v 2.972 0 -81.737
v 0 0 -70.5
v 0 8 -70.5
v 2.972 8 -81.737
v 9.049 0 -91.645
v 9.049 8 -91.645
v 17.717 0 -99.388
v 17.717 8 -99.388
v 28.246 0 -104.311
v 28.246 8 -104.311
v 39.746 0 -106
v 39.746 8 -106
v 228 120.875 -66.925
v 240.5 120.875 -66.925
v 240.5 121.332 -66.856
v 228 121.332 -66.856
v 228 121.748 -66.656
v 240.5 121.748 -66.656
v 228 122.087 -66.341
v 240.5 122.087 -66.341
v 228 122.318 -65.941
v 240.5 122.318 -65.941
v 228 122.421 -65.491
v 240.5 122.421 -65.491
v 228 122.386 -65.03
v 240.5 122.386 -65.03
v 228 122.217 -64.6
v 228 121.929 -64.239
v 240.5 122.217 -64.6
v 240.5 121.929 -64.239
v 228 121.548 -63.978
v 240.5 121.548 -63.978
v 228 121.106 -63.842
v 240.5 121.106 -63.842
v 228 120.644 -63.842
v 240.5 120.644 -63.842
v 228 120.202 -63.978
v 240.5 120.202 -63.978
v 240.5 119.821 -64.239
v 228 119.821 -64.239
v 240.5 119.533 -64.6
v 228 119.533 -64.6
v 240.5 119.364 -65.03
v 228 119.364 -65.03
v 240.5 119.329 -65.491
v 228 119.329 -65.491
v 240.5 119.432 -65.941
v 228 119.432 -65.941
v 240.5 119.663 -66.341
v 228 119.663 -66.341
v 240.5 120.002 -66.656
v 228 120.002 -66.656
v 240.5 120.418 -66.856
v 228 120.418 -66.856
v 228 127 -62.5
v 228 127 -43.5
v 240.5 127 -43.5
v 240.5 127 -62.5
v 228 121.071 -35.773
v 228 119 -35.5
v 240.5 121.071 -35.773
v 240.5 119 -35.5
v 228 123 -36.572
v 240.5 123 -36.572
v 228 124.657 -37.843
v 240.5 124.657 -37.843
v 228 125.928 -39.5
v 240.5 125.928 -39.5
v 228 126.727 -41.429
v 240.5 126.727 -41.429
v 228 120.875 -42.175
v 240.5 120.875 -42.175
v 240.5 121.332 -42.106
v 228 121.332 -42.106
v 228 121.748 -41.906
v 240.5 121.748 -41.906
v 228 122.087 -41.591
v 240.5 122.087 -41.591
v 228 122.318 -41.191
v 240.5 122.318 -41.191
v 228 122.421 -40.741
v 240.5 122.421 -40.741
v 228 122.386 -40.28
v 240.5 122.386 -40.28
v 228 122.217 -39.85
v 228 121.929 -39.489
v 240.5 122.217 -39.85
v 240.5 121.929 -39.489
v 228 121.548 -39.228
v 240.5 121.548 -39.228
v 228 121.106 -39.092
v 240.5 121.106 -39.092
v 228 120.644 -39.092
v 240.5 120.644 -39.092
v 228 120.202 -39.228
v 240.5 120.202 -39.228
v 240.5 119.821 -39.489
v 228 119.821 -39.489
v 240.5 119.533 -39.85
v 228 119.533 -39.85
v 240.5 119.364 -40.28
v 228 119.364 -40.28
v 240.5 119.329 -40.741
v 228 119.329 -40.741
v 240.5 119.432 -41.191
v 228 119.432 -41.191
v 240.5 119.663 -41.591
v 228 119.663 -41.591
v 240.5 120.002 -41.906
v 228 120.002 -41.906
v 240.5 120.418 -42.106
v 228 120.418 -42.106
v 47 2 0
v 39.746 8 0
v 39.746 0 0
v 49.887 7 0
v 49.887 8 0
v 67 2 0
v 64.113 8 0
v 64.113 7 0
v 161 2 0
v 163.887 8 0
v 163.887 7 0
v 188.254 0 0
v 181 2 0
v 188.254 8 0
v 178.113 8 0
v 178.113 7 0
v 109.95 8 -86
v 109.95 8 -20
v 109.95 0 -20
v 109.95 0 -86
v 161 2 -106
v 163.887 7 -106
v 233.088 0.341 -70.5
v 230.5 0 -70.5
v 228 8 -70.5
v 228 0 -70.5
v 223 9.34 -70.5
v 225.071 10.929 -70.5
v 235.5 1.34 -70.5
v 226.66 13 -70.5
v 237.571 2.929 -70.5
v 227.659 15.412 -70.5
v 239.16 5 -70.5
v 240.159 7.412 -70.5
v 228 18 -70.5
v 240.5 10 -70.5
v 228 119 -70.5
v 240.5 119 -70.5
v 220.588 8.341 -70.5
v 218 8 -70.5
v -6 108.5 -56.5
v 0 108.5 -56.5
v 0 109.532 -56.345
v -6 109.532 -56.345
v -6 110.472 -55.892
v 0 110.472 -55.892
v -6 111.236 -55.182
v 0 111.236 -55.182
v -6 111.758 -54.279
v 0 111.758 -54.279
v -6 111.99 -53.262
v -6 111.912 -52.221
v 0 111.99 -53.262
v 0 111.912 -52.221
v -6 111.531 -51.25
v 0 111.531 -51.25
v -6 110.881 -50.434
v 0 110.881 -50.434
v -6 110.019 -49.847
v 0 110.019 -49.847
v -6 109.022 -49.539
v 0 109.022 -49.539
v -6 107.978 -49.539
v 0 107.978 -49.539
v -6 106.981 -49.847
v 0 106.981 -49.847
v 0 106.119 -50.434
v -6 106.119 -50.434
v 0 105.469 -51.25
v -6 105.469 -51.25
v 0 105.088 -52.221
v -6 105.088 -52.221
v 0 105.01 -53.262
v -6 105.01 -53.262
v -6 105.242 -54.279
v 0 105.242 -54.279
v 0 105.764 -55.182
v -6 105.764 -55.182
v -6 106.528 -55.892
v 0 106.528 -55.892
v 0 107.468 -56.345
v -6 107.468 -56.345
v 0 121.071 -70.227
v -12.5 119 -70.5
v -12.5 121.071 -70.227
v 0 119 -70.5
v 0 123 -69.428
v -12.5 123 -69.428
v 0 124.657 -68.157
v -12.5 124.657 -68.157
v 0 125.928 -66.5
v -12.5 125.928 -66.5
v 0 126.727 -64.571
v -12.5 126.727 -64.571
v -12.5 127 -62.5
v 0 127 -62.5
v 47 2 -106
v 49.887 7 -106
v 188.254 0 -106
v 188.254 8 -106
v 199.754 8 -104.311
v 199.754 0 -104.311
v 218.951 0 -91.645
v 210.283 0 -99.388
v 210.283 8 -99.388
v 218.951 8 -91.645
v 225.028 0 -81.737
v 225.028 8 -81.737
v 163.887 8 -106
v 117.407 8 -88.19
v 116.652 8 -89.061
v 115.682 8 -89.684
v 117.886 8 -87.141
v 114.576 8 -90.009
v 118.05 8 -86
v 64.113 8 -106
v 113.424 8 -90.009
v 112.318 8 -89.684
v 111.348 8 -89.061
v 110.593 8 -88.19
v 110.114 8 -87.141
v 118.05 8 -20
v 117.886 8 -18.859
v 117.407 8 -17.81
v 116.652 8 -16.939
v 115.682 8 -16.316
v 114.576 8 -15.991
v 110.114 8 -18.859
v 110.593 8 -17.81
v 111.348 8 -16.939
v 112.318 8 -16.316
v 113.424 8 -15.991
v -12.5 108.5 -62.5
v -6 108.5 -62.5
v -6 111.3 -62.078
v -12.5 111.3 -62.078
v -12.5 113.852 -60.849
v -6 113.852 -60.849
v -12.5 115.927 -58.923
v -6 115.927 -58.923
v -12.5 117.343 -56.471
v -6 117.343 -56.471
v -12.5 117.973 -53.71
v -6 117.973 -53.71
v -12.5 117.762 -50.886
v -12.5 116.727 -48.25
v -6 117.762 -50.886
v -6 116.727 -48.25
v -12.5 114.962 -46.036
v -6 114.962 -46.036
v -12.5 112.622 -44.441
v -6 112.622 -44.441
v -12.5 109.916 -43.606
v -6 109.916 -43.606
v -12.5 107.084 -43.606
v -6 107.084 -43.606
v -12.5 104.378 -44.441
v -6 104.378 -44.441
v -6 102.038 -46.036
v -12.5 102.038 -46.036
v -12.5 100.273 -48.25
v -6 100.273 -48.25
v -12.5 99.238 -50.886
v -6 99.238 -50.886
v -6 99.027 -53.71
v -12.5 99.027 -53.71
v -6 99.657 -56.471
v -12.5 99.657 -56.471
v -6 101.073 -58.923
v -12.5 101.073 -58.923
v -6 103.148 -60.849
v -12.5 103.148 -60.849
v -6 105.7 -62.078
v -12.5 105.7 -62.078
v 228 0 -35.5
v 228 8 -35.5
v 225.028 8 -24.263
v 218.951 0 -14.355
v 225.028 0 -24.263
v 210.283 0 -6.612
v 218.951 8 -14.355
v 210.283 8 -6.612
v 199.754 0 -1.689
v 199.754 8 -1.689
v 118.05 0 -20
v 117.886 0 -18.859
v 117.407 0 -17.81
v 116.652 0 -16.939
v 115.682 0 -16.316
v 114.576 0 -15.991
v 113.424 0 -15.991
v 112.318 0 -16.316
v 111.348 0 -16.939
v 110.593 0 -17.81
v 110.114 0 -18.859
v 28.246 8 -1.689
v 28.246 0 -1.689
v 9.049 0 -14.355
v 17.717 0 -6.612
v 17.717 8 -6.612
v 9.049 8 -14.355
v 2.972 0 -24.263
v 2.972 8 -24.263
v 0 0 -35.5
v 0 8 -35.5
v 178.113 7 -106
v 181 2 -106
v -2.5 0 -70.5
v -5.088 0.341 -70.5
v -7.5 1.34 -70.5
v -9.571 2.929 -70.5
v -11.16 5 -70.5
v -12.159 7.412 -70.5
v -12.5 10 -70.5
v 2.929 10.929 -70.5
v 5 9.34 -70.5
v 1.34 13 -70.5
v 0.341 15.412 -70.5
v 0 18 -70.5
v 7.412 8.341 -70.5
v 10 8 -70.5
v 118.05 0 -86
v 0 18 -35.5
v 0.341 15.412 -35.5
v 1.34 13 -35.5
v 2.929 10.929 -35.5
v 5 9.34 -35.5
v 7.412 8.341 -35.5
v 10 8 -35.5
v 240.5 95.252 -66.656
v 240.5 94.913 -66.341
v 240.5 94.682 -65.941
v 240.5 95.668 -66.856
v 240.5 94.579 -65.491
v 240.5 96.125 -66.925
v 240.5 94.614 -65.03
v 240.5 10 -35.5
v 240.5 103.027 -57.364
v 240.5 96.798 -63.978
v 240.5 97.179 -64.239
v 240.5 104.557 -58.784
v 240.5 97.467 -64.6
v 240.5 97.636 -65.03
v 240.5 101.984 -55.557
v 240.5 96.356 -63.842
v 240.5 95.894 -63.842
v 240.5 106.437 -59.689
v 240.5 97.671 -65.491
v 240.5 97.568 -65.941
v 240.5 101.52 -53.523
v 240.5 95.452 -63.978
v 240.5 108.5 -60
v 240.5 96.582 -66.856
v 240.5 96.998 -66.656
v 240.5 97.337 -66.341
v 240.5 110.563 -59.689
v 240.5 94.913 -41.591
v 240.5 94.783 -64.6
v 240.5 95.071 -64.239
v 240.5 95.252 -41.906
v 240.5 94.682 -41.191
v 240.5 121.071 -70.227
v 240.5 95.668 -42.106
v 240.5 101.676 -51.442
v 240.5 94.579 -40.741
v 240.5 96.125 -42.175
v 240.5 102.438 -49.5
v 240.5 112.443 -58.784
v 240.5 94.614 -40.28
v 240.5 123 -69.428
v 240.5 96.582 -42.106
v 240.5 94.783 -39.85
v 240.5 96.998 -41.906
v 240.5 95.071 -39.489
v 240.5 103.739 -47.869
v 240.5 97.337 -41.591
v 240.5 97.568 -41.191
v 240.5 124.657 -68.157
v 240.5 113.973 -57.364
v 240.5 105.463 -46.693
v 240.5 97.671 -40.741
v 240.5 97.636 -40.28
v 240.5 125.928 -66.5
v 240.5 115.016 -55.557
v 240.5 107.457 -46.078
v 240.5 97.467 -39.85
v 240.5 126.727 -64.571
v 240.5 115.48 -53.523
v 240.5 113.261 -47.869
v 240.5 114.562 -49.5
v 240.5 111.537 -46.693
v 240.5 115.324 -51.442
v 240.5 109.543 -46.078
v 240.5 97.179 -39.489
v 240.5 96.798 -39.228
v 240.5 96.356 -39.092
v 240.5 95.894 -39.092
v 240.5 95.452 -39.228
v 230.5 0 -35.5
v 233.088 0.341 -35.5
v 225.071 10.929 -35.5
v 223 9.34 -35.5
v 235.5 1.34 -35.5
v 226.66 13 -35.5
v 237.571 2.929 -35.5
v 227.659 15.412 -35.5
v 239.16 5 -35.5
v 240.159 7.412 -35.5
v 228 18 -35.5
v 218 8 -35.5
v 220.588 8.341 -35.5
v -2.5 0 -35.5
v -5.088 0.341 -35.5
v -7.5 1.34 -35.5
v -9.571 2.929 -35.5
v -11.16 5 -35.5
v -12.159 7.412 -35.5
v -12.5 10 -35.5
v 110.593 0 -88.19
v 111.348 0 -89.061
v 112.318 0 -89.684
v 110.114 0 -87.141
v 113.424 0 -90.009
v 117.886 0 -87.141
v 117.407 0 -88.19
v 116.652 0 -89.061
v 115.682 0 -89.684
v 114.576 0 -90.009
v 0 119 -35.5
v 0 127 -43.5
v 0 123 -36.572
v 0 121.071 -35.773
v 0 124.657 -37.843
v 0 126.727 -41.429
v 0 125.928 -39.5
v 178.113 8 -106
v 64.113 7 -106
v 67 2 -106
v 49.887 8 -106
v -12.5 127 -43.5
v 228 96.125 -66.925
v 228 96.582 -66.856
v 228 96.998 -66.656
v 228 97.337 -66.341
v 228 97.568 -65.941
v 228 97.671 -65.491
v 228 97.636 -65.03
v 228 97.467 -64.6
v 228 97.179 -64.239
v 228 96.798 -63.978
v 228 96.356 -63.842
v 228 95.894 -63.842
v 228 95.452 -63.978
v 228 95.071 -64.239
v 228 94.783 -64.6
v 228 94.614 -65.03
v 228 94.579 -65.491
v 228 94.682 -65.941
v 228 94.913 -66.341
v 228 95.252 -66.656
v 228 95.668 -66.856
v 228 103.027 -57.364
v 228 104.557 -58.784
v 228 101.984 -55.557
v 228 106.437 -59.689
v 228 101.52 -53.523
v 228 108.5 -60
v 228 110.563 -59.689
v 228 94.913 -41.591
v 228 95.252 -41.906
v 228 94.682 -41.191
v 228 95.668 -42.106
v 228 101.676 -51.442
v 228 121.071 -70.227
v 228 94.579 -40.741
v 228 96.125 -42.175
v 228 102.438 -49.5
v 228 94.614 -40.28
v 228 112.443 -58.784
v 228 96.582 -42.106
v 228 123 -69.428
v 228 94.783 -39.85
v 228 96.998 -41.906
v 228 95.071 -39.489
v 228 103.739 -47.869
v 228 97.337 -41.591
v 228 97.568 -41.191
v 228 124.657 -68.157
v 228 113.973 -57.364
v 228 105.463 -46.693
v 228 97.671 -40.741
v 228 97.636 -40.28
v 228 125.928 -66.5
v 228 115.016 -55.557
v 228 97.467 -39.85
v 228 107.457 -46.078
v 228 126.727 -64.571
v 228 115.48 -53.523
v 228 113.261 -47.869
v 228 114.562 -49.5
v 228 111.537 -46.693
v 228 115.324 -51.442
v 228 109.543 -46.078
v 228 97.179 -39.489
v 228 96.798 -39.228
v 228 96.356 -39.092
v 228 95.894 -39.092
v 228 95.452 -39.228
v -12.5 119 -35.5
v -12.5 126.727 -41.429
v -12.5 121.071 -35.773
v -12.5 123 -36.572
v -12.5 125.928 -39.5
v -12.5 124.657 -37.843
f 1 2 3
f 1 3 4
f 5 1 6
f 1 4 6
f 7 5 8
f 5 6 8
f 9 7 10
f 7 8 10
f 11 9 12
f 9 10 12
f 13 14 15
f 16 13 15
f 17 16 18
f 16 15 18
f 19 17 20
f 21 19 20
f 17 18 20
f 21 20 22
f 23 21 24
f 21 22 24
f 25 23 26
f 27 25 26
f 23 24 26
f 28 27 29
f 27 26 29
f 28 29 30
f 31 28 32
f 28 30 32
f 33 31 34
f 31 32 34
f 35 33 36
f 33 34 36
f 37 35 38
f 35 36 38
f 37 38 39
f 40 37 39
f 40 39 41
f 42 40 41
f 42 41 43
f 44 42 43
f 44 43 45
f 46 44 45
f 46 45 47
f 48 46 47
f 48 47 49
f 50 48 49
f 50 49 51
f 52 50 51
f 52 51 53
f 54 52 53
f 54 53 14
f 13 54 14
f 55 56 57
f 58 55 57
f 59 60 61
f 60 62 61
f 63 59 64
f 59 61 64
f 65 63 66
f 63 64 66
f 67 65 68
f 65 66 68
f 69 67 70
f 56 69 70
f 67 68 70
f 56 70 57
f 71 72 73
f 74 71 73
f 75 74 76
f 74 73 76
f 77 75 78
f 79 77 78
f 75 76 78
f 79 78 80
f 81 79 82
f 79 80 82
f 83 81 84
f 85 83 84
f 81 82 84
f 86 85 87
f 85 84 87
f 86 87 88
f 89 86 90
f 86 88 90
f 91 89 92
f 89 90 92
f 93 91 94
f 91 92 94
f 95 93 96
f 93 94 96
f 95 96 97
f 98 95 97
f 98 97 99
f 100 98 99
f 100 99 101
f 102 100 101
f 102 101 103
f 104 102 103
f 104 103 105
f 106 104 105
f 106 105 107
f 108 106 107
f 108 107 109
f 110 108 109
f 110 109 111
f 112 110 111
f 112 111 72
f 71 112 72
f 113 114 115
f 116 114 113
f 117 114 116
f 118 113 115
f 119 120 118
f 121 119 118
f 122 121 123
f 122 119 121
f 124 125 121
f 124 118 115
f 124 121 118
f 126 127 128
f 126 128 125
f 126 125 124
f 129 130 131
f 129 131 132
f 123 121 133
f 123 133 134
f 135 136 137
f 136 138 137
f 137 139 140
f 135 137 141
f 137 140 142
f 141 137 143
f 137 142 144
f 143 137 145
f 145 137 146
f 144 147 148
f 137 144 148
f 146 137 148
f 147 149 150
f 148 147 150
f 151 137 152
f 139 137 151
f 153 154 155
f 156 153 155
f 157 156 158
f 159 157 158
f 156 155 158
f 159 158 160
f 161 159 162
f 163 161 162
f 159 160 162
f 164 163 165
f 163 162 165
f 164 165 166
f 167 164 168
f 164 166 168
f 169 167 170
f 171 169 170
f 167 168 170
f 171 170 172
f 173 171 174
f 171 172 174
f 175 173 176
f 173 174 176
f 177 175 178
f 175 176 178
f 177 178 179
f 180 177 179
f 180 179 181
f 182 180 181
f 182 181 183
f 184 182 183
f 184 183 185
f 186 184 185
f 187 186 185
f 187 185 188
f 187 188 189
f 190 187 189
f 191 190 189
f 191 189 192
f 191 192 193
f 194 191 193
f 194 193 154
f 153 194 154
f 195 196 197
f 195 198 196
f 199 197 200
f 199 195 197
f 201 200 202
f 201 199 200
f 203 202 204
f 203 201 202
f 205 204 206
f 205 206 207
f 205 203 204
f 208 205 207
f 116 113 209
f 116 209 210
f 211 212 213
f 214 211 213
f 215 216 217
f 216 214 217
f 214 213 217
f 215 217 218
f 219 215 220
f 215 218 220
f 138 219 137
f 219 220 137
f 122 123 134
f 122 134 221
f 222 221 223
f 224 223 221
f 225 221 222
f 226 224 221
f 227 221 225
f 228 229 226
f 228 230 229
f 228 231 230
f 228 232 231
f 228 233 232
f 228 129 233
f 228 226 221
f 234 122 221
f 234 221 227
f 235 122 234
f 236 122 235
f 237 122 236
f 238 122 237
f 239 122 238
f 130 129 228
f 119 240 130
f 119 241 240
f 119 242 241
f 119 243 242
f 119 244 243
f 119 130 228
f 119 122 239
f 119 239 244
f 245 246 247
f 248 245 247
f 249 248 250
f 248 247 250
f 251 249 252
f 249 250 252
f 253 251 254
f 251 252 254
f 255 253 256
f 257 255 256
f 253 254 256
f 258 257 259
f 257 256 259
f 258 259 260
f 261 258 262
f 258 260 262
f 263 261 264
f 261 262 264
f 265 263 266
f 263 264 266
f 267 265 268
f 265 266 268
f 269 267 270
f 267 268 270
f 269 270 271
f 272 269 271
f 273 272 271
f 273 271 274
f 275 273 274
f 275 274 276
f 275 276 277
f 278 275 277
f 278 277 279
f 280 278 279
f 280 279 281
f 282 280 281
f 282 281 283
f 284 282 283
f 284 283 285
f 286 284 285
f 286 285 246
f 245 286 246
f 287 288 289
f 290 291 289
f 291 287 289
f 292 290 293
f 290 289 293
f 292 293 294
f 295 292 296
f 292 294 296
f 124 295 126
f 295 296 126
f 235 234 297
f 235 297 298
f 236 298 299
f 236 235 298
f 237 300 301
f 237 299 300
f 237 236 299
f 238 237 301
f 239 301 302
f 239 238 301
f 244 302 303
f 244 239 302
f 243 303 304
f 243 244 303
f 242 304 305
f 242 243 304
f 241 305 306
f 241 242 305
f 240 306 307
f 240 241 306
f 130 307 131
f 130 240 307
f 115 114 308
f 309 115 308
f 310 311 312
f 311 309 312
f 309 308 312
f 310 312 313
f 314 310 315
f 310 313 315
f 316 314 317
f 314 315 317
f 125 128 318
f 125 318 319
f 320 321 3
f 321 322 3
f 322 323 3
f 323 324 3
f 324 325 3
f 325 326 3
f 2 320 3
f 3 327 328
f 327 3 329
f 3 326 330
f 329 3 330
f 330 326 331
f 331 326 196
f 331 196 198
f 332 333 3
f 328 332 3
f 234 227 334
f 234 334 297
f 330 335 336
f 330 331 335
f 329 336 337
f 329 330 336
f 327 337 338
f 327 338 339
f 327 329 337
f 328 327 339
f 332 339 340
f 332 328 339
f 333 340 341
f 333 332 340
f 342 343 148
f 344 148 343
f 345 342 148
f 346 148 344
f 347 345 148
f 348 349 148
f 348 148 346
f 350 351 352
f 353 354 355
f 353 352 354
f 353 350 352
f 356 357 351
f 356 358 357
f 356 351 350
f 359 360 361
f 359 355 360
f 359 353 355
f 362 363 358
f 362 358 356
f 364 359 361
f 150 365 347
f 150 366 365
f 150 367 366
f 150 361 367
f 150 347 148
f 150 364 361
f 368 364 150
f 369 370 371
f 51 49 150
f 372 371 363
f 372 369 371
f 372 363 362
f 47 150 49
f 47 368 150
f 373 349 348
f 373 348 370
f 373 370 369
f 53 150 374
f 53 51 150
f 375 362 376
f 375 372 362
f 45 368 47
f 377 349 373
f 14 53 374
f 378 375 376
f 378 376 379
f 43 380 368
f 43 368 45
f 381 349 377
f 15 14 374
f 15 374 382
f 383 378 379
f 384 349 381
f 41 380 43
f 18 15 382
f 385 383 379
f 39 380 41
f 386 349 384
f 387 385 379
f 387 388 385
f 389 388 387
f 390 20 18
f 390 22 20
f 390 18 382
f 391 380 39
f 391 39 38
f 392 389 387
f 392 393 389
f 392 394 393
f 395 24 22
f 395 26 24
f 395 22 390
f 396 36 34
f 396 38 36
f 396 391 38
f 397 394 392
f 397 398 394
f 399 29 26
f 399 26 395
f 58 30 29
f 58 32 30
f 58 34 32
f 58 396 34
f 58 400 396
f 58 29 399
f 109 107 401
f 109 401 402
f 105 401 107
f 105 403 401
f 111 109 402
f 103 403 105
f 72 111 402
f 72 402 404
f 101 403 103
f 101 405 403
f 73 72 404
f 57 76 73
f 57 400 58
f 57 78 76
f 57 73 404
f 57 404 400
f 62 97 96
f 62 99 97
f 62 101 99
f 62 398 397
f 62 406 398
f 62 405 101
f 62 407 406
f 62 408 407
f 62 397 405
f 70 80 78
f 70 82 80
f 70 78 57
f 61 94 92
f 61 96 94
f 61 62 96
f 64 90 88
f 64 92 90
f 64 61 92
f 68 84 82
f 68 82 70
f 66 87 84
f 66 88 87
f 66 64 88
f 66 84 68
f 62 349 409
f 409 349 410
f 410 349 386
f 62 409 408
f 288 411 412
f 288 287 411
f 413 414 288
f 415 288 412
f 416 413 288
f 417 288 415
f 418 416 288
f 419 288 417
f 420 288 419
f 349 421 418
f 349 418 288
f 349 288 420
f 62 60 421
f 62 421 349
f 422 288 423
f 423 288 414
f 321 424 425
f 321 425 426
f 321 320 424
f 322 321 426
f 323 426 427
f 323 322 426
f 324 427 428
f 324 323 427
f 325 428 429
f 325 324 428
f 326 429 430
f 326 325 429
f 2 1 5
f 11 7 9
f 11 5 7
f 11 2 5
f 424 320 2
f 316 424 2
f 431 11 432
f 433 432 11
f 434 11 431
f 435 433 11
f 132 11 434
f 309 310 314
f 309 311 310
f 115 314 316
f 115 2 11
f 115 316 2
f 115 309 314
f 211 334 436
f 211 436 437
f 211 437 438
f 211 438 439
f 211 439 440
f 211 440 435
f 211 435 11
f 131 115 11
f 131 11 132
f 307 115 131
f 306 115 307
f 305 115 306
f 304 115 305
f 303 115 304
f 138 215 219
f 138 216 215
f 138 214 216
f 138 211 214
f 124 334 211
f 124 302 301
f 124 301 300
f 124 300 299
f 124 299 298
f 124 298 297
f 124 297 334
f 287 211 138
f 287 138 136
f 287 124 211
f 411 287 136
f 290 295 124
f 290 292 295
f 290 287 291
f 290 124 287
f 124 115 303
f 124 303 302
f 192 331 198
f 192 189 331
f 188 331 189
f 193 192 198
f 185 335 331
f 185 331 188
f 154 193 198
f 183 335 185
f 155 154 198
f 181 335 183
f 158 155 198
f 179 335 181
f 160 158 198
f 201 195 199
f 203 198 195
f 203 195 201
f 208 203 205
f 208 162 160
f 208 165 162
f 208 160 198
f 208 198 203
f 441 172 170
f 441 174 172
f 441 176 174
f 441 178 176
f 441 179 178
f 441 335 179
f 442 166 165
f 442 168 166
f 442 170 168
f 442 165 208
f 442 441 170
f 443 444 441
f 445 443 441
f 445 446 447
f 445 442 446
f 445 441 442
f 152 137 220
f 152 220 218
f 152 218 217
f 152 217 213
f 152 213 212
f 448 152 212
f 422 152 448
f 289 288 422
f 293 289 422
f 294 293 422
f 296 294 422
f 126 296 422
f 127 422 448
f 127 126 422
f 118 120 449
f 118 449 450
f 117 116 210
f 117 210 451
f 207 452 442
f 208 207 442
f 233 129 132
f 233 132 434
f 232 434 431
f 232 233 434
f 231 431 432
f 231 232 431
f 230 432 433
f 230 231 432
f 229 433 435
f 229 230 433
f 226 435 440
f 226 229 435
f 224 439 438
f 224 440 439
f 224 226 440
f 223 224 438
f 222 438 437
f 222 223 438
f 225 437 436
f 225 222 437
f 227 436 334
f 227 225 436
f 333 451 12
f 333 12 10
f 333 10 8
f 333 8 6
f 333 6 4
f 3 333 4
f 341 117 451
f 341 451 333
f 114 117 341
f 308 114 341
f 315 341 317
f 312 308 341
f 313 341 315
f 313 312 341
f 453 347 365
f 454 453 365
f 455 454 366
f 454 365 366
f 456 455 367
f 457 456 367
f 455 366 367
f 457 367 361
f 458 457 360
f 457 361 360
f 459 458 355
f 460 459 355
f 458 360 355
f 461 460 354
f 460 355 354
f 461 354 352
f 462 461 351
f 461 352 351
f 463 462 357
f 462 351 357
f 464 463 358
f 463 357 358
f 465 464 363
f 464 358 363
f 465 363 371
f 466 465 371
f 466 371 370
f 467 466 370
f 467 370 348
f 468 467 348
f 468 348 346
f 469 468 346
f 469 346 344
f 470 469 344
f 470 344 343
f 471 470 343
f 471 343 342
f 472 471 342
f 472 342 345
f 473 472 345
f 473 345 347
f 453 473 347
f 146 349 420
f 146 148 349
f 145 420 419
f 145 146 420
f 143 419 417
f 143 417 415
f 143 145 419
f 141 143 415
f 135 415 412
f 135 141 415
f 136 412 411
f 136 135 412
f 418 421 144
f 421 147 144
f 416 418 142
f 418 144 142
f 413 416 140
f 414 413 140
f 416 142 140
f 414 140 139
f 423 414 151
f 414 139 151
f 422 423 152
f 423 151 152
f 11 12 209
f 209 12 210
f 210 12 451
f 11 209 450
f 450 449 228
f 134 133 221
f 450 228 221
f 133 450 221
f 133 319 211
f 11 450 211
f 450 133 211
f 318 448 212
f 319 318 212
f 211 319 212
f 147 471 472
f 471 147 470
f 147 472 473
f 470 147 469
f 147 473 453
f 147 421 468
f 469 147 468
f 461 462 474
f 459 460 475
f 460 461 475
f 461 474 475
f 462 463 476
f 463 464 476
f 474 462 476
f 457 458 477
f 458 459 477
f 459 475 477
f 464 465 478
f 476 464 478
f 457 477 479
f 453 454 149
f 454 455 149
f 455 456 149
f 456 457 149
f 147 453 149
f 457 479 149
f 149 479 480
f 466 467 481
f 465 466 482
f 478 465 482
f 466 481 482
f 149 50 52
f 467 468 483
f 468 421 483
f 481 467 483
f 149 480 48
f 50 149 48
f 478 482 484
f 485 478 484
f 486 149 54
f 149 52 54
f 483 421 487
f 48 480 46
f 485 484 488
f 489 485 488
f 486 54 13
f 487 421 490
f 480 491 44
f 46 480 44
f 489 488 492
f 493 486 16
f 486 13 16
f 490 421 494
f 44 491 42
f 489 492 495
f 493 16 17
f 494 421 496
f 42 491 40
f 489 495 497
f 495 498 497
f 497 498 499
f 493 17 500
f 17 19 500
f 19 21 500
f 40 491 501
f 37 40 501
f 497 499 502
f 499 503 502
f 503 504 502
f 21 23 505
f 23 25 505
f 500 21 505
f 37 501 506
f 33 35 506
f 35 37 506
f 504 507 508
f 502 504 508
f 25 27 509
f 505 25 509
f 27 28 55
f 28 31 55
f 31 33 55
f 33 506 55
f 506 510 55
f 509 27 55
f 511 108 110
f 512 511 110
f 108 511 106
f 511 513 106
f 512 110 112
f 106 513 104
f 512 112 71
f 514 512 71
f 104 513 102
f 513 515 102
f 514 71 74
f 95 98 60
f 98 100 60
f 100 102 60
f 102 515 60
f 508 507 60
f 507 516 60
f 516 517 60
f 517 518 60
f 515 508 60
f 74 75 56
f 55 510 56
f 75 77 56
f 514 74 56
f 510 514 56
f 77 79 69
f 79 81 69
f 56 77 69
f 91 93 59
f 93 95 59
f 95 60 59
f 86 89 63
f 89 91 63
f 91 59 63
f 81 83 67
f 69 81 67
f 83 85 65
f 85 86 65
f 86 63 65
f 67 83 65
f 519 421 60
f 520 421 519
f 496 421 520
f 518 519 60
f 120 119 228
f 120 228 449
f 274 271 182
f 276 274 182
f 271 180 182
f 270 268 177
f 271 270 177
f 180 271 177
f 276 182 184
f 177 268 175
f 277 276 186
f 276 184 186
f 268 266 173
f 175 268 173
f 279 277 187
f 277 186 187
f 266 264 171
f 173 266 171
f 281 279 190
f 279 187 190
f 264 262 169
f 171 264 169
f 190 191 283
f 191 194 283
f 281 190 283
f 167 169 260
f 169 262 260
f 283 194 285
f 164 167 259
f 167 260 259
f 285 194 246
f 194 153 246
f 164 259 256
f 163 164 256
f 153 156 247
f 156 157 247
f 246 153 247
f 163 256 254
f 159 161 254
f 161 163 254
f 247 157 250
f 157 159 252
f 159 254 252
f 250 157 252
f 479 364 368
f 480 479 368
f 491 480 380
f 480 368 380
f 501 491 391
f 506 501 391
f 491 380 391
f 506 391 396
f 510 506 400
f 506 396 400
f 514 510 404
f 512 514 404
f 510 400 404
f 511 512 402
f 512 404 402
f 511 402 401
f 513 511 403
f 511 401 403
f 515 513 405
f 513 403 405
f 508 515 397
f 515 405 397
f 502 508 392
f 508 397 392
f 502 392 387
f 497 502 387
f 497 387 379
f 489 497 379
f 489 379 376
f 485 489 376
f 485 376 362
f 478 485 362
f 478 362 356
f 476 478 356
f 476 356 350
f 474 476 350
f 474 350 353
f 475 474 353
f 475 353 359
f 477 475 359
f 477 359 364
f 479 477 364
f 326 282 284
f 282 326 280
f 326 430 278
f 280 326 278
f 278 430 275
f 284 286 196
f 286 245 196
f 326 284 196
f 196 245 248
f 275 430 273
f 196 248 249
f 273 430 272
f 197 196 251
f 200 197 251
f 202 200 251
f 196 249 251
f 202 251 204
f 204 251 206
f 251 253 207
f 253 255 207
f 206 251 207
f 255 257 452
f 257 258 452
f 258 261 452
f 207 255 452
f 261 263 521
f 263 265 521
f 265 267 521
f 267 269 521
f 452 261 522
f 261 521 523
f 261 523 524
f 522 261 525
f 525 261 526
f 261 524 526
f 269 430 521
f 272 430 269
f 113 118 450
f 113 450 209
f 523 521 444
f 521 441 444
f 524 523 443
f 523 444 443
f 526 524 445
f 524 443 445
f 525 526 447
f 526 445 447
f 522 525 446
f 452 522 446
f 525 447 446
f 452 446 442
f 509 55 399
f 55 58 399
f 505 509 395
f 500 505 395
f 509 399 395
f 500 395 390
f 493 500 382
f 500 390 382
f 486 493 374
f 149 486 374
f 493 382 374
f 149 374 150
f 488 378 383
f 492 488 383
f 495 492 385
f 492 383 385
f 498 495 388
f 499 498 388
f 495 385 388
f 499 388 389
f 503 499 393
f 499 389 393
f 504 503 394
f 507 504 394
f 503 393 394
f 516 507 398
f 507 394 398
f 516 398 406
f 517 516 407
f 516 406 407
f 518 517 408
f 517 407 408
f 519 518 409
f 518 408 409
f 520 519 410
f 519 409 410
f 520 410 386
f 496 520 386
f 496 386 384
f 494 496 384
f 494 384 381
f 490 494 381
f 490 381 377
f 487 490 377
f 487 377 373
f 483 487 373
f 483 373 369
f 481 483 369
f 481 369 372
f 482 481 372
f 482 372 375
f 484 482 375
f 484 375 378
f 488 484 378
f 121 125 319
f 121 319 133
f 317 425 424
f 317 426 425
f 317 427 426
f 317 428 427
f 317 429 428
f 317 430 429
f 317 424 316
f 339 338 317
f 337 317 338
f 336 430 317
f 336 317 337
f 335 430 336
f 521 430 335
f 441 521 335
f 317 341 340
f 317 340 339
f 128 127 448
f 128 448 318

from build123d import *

# Parameters (mm, degrees)
SKETCH1_W           = 12.5
SKETCH1_H           = 127
BOSS_EXTRUDE1_DEPTH = 106
SKETCH2_W           = 12.5
SKETCH2_H           = 35.5
CUT_EXTRUDE1_DEPTH  = 200
SKETCH4_4_R         = 6
CUT_EXTRUDE3_DEPTH  = 37
SKETCH4_R           = 7
SKETCH4_R_2         = 1.55
CUT_EXTRUDE4_DEPTH  = 18.375
FILLET3_R           = 8
FILLET4_R           = 10
FILLET5_R           = 40
SKETCH5_R           = 3.5
CUT_EXTRUDE5_DEPTH  = 25
CUT_EXTRUDE6_START  = -6
SKETCH5_3_R         = 9.5
SKETCH5_3_R_2       = 3.5
CUT_EXTRUDE6_DEPTH  = 7


with BuildPart() as part:
    # Sketch1 → Boss-Extrude1 (new body)
    with BuildSketch(Plane.XY):
        Polygon((0, 8), (0, 0), (228, 0), (228, 8), (178.113248654, 8), (178.113248654, 7), (181, 2), (161, 2), (163.886751346, 7), (163.886751346, 8), (64.113248654, 8), (64.113248654, 7), (67, 2), (47, 2), (49.886751346, 7), (49.886751346, 8), align=None)
        with Locations((234.25, 63.5)):
            Rectangle(SKETCH1_W, SKETCH1_H)
        with Locations((-6.25, 63.5)):
            Rectangle(SKETCH1_W, SKETCH1_H)
    extrude(amount=-BOSS_EXTRUDE1_DEPTH)

    # Sketch2 → Cut-Extrude1 (cut)
    with BuildSketch(Plane(origin=(0, 127, 0), x_dir=(1, 0, 0), z_dir=(0, 1, 0))):
        with Locations((-6.25, 88.25)):
            Rectangle(SKETCH2_W, SKETCH2_H)
        with Locations((-6.25, 17.75)):
            Rectangle(SKETCH2_W, SKETCH2_H)
        with Locations((234.25, 88.25)):
            Rectangle(SKETCH2_W, SKETCH2_H)
        with Locations((234.25, 17.75)):
            Rectangle(SKETCH2_W, SKETCH2_H)
        with BuildLine():
            Line((109.95, 20), (109.95, 86))
            ThreePointArc((109.95, 86), (114, 90.05), (118.05, 86))
            Line((118.05, 86), (118.05, 20))
            ThreePointArc((118.05, 20), (114, 15.95), (109.95, 20))
        make_face()
    extrude(amount=-CUT_EXTRUDE1_DEPTH, mode=Mode.SUBTRACT)

    # Sketch4<4> → Cut-Extrude3 (cut)
    with BuildSketch(Plane(origin=(240.5, 0, 0), x_dir=(0, 0, -1), z_dir=(1, 0, 0))):
        with Locations((53, 108.5)):
            Circle(SKETCH4_4_R)
    extrude(amount=-CUT_EXTRUDE3_DEPTH, mode=Mode.SUBTRACT)

    # Sketch4 → Cut-Extrude4 (cut)
    with BuildSketch(Plane(origin=(240.5, 0, 0), x_dir=(0, 0, -1), z_dir=(1, 0, 0))):
        with Locations((53, 108.5)):
            Circle(SKETCH4_R)
        with Locations((40.625, 120.875)):
            Circle(SKETCH4_R_2)
        with Locations((40.625, 96.125)):
            Circle(SKETCH4_R_2)
        with Locations((65.375, 96.125)):
            Circle(SKETCH4_R_2)
        with Locations((65.375, 120.875)):
            Circle(SKETCH4_R_2)
    extrude(amount=-CUT_EXTRUDE4_DEPTH, mode=Mode.SUBTRACT)

    # Fillet3
    fillet3_edges = [part.edges().sort_by_distance(p)[0] for p in [
        (-6.25, 127, -35.5),
        (234.25, 127, -70.5),
        (234.25, 127, -35.5),
        (-6.25, 127, -70.5),
    ]]
    fillet(fillet3_edges, radius=FILLET3_R)

    # Fillet4
    fillet4_edges = [part.edges().sort_by_distance(p)[0] for p in [
        (228, 8, -53),
        (240.5, 0, -53),
        (0, 8, -53),
        (-12.5, 0, -53),
    ]]
    fillet(fillet4_edges, radius=FILLET4_R)

    # Fillet5
    # the kernel refuses this fillet: 40 mm, written as the material it takes off along each edge
    with BuildSketch(Plane(origin=(228, 107.36517247, -106), x_dir=(-1, 0, 0), z_dir=(0, -1, 0))) as fillet5_piece_1:
        with BuildLine():
            CenterArc((39.746068988, -40), FILLET5_R, 90, 83.540550223)
            Line((0, -35.5), (-0.79492138, -35.41))
            ThreePointArc((-0.79492138, -35.41), (-0.8, -17.75), (-0.8, 0))
            Line((-0.8, 0), (0, 0.8))
            Line((0, 0.8), (39.746068988, 0.8))
            Line((39.746068988, 0.8), (39.746068988, 0))
        make_face()
    extrude(amount=206.73034494, mode=Mode.SUBTRACT)
    with BuildSketch(Plane(origin=(0, 107.36517247, -106), x_dir=(0, 0, 1), z_dir=(0, -1, 0))) as fillet5_piece_2:
        with BuildLine():
            CenterArc((40, -39.746068988), FILLET5_R, 96.459449777, 83.540550223)
            Line((0, -39.746068988), (-0.8, -39.746068988))
            Line((-0.8, -39.746068988), (-0.8, 0))
            Line((-0.8, 0), (0, 0.8))
            ThreePointArc((0, 0.8), (17.75, 0.8), (35.41, 0.79492138))
            Line((35.41, 0.79492138), (35.5, 0))
        make_face()
    extrude(amount=206.73034494, mode=Mode.SUBTRACT)
    with BuildSketch(Plane(origin=(0, 107.36517247, 0), x_dir=(0, 0, -1), z_dir=(0, -1, 0))) as fillet5_piece_3:
        with BuildLine():
            CenterArc((40, 39.746068988), FILLET5_R, 180, 83.540550223)
            Line((0, 39.746068988), (-0.8, 39.746068988))
            Line((-0.8, 39.746068988), (-0.8, 0))
            Line((-0.8, 0), (0, -0.8))
            ThreePointArc((0, -0.8), (17.75, -0.8), (35.41, -0.79492138))
            Line((35.41, -0.79492138), (35.5, 0))
        make_face()
    extrude(amount=206.73034494, mode=Mode.SUBTRACT)
    with BuildSketch(Plane(origin=(228, 107.36517247, 0), x_dir=(-1, 0, 0), z_dir=(0, -1, 0))) as fillet5_piece_4:
        with BuildLine():
            CenterArc((39.746068988, 40), FILLET5_R, 186.459449777, 83.540550223)
            Line((0, 35.5), (-0.79492138, 35.41))
            ThreePointArc((-0.79492138, 35.41), (-0.8, 17.75), (-0.8, 0))
            Line((-0.8, 0), (0, -0.8))
            Line((0, -0.8), (39.746068988, -0.8))
            Line((39.746068988, -0.8), (39.746068988, 0))
        make_face()
    extrude(amount=206.73034494, mode=Mode.SUBTRACT)

    # Sketch5 → Cut-Extrude5 (cut)
    with BuildSketch(Plane(origin=(0, 0, 0), x_dir=(0, 0, -1), z_dir=(1, 0, 0))):
        with Locations((53, 108.5)):
            Circle(SKETCH5_R)
    extrude(amount=-CUT_EXTRUDE5_DEPTH, mode=Mode.SUBTRACT)

    # Sketch5<3> → Cut-Extrude6 (cut)
    with BuildSketch(Plane(origin=(0, 0, 0), x_dir=(0, 0, -1), z_dir=(1, 0, 0)).offset(CUT_EXTRUDE6_START)):
        with Locations((53, 108.5)):
            Circle(SKETCH5_3_R)
        with Locations((53, 108.5)):
            Circle(SKETCH5_3_R_2, mode=Mode.SUBTRACT)
    extrude(amount=-CUT_EXTRUDE6_DEPTH, mode=Mode.SUBTRACT)


solid = part.part
